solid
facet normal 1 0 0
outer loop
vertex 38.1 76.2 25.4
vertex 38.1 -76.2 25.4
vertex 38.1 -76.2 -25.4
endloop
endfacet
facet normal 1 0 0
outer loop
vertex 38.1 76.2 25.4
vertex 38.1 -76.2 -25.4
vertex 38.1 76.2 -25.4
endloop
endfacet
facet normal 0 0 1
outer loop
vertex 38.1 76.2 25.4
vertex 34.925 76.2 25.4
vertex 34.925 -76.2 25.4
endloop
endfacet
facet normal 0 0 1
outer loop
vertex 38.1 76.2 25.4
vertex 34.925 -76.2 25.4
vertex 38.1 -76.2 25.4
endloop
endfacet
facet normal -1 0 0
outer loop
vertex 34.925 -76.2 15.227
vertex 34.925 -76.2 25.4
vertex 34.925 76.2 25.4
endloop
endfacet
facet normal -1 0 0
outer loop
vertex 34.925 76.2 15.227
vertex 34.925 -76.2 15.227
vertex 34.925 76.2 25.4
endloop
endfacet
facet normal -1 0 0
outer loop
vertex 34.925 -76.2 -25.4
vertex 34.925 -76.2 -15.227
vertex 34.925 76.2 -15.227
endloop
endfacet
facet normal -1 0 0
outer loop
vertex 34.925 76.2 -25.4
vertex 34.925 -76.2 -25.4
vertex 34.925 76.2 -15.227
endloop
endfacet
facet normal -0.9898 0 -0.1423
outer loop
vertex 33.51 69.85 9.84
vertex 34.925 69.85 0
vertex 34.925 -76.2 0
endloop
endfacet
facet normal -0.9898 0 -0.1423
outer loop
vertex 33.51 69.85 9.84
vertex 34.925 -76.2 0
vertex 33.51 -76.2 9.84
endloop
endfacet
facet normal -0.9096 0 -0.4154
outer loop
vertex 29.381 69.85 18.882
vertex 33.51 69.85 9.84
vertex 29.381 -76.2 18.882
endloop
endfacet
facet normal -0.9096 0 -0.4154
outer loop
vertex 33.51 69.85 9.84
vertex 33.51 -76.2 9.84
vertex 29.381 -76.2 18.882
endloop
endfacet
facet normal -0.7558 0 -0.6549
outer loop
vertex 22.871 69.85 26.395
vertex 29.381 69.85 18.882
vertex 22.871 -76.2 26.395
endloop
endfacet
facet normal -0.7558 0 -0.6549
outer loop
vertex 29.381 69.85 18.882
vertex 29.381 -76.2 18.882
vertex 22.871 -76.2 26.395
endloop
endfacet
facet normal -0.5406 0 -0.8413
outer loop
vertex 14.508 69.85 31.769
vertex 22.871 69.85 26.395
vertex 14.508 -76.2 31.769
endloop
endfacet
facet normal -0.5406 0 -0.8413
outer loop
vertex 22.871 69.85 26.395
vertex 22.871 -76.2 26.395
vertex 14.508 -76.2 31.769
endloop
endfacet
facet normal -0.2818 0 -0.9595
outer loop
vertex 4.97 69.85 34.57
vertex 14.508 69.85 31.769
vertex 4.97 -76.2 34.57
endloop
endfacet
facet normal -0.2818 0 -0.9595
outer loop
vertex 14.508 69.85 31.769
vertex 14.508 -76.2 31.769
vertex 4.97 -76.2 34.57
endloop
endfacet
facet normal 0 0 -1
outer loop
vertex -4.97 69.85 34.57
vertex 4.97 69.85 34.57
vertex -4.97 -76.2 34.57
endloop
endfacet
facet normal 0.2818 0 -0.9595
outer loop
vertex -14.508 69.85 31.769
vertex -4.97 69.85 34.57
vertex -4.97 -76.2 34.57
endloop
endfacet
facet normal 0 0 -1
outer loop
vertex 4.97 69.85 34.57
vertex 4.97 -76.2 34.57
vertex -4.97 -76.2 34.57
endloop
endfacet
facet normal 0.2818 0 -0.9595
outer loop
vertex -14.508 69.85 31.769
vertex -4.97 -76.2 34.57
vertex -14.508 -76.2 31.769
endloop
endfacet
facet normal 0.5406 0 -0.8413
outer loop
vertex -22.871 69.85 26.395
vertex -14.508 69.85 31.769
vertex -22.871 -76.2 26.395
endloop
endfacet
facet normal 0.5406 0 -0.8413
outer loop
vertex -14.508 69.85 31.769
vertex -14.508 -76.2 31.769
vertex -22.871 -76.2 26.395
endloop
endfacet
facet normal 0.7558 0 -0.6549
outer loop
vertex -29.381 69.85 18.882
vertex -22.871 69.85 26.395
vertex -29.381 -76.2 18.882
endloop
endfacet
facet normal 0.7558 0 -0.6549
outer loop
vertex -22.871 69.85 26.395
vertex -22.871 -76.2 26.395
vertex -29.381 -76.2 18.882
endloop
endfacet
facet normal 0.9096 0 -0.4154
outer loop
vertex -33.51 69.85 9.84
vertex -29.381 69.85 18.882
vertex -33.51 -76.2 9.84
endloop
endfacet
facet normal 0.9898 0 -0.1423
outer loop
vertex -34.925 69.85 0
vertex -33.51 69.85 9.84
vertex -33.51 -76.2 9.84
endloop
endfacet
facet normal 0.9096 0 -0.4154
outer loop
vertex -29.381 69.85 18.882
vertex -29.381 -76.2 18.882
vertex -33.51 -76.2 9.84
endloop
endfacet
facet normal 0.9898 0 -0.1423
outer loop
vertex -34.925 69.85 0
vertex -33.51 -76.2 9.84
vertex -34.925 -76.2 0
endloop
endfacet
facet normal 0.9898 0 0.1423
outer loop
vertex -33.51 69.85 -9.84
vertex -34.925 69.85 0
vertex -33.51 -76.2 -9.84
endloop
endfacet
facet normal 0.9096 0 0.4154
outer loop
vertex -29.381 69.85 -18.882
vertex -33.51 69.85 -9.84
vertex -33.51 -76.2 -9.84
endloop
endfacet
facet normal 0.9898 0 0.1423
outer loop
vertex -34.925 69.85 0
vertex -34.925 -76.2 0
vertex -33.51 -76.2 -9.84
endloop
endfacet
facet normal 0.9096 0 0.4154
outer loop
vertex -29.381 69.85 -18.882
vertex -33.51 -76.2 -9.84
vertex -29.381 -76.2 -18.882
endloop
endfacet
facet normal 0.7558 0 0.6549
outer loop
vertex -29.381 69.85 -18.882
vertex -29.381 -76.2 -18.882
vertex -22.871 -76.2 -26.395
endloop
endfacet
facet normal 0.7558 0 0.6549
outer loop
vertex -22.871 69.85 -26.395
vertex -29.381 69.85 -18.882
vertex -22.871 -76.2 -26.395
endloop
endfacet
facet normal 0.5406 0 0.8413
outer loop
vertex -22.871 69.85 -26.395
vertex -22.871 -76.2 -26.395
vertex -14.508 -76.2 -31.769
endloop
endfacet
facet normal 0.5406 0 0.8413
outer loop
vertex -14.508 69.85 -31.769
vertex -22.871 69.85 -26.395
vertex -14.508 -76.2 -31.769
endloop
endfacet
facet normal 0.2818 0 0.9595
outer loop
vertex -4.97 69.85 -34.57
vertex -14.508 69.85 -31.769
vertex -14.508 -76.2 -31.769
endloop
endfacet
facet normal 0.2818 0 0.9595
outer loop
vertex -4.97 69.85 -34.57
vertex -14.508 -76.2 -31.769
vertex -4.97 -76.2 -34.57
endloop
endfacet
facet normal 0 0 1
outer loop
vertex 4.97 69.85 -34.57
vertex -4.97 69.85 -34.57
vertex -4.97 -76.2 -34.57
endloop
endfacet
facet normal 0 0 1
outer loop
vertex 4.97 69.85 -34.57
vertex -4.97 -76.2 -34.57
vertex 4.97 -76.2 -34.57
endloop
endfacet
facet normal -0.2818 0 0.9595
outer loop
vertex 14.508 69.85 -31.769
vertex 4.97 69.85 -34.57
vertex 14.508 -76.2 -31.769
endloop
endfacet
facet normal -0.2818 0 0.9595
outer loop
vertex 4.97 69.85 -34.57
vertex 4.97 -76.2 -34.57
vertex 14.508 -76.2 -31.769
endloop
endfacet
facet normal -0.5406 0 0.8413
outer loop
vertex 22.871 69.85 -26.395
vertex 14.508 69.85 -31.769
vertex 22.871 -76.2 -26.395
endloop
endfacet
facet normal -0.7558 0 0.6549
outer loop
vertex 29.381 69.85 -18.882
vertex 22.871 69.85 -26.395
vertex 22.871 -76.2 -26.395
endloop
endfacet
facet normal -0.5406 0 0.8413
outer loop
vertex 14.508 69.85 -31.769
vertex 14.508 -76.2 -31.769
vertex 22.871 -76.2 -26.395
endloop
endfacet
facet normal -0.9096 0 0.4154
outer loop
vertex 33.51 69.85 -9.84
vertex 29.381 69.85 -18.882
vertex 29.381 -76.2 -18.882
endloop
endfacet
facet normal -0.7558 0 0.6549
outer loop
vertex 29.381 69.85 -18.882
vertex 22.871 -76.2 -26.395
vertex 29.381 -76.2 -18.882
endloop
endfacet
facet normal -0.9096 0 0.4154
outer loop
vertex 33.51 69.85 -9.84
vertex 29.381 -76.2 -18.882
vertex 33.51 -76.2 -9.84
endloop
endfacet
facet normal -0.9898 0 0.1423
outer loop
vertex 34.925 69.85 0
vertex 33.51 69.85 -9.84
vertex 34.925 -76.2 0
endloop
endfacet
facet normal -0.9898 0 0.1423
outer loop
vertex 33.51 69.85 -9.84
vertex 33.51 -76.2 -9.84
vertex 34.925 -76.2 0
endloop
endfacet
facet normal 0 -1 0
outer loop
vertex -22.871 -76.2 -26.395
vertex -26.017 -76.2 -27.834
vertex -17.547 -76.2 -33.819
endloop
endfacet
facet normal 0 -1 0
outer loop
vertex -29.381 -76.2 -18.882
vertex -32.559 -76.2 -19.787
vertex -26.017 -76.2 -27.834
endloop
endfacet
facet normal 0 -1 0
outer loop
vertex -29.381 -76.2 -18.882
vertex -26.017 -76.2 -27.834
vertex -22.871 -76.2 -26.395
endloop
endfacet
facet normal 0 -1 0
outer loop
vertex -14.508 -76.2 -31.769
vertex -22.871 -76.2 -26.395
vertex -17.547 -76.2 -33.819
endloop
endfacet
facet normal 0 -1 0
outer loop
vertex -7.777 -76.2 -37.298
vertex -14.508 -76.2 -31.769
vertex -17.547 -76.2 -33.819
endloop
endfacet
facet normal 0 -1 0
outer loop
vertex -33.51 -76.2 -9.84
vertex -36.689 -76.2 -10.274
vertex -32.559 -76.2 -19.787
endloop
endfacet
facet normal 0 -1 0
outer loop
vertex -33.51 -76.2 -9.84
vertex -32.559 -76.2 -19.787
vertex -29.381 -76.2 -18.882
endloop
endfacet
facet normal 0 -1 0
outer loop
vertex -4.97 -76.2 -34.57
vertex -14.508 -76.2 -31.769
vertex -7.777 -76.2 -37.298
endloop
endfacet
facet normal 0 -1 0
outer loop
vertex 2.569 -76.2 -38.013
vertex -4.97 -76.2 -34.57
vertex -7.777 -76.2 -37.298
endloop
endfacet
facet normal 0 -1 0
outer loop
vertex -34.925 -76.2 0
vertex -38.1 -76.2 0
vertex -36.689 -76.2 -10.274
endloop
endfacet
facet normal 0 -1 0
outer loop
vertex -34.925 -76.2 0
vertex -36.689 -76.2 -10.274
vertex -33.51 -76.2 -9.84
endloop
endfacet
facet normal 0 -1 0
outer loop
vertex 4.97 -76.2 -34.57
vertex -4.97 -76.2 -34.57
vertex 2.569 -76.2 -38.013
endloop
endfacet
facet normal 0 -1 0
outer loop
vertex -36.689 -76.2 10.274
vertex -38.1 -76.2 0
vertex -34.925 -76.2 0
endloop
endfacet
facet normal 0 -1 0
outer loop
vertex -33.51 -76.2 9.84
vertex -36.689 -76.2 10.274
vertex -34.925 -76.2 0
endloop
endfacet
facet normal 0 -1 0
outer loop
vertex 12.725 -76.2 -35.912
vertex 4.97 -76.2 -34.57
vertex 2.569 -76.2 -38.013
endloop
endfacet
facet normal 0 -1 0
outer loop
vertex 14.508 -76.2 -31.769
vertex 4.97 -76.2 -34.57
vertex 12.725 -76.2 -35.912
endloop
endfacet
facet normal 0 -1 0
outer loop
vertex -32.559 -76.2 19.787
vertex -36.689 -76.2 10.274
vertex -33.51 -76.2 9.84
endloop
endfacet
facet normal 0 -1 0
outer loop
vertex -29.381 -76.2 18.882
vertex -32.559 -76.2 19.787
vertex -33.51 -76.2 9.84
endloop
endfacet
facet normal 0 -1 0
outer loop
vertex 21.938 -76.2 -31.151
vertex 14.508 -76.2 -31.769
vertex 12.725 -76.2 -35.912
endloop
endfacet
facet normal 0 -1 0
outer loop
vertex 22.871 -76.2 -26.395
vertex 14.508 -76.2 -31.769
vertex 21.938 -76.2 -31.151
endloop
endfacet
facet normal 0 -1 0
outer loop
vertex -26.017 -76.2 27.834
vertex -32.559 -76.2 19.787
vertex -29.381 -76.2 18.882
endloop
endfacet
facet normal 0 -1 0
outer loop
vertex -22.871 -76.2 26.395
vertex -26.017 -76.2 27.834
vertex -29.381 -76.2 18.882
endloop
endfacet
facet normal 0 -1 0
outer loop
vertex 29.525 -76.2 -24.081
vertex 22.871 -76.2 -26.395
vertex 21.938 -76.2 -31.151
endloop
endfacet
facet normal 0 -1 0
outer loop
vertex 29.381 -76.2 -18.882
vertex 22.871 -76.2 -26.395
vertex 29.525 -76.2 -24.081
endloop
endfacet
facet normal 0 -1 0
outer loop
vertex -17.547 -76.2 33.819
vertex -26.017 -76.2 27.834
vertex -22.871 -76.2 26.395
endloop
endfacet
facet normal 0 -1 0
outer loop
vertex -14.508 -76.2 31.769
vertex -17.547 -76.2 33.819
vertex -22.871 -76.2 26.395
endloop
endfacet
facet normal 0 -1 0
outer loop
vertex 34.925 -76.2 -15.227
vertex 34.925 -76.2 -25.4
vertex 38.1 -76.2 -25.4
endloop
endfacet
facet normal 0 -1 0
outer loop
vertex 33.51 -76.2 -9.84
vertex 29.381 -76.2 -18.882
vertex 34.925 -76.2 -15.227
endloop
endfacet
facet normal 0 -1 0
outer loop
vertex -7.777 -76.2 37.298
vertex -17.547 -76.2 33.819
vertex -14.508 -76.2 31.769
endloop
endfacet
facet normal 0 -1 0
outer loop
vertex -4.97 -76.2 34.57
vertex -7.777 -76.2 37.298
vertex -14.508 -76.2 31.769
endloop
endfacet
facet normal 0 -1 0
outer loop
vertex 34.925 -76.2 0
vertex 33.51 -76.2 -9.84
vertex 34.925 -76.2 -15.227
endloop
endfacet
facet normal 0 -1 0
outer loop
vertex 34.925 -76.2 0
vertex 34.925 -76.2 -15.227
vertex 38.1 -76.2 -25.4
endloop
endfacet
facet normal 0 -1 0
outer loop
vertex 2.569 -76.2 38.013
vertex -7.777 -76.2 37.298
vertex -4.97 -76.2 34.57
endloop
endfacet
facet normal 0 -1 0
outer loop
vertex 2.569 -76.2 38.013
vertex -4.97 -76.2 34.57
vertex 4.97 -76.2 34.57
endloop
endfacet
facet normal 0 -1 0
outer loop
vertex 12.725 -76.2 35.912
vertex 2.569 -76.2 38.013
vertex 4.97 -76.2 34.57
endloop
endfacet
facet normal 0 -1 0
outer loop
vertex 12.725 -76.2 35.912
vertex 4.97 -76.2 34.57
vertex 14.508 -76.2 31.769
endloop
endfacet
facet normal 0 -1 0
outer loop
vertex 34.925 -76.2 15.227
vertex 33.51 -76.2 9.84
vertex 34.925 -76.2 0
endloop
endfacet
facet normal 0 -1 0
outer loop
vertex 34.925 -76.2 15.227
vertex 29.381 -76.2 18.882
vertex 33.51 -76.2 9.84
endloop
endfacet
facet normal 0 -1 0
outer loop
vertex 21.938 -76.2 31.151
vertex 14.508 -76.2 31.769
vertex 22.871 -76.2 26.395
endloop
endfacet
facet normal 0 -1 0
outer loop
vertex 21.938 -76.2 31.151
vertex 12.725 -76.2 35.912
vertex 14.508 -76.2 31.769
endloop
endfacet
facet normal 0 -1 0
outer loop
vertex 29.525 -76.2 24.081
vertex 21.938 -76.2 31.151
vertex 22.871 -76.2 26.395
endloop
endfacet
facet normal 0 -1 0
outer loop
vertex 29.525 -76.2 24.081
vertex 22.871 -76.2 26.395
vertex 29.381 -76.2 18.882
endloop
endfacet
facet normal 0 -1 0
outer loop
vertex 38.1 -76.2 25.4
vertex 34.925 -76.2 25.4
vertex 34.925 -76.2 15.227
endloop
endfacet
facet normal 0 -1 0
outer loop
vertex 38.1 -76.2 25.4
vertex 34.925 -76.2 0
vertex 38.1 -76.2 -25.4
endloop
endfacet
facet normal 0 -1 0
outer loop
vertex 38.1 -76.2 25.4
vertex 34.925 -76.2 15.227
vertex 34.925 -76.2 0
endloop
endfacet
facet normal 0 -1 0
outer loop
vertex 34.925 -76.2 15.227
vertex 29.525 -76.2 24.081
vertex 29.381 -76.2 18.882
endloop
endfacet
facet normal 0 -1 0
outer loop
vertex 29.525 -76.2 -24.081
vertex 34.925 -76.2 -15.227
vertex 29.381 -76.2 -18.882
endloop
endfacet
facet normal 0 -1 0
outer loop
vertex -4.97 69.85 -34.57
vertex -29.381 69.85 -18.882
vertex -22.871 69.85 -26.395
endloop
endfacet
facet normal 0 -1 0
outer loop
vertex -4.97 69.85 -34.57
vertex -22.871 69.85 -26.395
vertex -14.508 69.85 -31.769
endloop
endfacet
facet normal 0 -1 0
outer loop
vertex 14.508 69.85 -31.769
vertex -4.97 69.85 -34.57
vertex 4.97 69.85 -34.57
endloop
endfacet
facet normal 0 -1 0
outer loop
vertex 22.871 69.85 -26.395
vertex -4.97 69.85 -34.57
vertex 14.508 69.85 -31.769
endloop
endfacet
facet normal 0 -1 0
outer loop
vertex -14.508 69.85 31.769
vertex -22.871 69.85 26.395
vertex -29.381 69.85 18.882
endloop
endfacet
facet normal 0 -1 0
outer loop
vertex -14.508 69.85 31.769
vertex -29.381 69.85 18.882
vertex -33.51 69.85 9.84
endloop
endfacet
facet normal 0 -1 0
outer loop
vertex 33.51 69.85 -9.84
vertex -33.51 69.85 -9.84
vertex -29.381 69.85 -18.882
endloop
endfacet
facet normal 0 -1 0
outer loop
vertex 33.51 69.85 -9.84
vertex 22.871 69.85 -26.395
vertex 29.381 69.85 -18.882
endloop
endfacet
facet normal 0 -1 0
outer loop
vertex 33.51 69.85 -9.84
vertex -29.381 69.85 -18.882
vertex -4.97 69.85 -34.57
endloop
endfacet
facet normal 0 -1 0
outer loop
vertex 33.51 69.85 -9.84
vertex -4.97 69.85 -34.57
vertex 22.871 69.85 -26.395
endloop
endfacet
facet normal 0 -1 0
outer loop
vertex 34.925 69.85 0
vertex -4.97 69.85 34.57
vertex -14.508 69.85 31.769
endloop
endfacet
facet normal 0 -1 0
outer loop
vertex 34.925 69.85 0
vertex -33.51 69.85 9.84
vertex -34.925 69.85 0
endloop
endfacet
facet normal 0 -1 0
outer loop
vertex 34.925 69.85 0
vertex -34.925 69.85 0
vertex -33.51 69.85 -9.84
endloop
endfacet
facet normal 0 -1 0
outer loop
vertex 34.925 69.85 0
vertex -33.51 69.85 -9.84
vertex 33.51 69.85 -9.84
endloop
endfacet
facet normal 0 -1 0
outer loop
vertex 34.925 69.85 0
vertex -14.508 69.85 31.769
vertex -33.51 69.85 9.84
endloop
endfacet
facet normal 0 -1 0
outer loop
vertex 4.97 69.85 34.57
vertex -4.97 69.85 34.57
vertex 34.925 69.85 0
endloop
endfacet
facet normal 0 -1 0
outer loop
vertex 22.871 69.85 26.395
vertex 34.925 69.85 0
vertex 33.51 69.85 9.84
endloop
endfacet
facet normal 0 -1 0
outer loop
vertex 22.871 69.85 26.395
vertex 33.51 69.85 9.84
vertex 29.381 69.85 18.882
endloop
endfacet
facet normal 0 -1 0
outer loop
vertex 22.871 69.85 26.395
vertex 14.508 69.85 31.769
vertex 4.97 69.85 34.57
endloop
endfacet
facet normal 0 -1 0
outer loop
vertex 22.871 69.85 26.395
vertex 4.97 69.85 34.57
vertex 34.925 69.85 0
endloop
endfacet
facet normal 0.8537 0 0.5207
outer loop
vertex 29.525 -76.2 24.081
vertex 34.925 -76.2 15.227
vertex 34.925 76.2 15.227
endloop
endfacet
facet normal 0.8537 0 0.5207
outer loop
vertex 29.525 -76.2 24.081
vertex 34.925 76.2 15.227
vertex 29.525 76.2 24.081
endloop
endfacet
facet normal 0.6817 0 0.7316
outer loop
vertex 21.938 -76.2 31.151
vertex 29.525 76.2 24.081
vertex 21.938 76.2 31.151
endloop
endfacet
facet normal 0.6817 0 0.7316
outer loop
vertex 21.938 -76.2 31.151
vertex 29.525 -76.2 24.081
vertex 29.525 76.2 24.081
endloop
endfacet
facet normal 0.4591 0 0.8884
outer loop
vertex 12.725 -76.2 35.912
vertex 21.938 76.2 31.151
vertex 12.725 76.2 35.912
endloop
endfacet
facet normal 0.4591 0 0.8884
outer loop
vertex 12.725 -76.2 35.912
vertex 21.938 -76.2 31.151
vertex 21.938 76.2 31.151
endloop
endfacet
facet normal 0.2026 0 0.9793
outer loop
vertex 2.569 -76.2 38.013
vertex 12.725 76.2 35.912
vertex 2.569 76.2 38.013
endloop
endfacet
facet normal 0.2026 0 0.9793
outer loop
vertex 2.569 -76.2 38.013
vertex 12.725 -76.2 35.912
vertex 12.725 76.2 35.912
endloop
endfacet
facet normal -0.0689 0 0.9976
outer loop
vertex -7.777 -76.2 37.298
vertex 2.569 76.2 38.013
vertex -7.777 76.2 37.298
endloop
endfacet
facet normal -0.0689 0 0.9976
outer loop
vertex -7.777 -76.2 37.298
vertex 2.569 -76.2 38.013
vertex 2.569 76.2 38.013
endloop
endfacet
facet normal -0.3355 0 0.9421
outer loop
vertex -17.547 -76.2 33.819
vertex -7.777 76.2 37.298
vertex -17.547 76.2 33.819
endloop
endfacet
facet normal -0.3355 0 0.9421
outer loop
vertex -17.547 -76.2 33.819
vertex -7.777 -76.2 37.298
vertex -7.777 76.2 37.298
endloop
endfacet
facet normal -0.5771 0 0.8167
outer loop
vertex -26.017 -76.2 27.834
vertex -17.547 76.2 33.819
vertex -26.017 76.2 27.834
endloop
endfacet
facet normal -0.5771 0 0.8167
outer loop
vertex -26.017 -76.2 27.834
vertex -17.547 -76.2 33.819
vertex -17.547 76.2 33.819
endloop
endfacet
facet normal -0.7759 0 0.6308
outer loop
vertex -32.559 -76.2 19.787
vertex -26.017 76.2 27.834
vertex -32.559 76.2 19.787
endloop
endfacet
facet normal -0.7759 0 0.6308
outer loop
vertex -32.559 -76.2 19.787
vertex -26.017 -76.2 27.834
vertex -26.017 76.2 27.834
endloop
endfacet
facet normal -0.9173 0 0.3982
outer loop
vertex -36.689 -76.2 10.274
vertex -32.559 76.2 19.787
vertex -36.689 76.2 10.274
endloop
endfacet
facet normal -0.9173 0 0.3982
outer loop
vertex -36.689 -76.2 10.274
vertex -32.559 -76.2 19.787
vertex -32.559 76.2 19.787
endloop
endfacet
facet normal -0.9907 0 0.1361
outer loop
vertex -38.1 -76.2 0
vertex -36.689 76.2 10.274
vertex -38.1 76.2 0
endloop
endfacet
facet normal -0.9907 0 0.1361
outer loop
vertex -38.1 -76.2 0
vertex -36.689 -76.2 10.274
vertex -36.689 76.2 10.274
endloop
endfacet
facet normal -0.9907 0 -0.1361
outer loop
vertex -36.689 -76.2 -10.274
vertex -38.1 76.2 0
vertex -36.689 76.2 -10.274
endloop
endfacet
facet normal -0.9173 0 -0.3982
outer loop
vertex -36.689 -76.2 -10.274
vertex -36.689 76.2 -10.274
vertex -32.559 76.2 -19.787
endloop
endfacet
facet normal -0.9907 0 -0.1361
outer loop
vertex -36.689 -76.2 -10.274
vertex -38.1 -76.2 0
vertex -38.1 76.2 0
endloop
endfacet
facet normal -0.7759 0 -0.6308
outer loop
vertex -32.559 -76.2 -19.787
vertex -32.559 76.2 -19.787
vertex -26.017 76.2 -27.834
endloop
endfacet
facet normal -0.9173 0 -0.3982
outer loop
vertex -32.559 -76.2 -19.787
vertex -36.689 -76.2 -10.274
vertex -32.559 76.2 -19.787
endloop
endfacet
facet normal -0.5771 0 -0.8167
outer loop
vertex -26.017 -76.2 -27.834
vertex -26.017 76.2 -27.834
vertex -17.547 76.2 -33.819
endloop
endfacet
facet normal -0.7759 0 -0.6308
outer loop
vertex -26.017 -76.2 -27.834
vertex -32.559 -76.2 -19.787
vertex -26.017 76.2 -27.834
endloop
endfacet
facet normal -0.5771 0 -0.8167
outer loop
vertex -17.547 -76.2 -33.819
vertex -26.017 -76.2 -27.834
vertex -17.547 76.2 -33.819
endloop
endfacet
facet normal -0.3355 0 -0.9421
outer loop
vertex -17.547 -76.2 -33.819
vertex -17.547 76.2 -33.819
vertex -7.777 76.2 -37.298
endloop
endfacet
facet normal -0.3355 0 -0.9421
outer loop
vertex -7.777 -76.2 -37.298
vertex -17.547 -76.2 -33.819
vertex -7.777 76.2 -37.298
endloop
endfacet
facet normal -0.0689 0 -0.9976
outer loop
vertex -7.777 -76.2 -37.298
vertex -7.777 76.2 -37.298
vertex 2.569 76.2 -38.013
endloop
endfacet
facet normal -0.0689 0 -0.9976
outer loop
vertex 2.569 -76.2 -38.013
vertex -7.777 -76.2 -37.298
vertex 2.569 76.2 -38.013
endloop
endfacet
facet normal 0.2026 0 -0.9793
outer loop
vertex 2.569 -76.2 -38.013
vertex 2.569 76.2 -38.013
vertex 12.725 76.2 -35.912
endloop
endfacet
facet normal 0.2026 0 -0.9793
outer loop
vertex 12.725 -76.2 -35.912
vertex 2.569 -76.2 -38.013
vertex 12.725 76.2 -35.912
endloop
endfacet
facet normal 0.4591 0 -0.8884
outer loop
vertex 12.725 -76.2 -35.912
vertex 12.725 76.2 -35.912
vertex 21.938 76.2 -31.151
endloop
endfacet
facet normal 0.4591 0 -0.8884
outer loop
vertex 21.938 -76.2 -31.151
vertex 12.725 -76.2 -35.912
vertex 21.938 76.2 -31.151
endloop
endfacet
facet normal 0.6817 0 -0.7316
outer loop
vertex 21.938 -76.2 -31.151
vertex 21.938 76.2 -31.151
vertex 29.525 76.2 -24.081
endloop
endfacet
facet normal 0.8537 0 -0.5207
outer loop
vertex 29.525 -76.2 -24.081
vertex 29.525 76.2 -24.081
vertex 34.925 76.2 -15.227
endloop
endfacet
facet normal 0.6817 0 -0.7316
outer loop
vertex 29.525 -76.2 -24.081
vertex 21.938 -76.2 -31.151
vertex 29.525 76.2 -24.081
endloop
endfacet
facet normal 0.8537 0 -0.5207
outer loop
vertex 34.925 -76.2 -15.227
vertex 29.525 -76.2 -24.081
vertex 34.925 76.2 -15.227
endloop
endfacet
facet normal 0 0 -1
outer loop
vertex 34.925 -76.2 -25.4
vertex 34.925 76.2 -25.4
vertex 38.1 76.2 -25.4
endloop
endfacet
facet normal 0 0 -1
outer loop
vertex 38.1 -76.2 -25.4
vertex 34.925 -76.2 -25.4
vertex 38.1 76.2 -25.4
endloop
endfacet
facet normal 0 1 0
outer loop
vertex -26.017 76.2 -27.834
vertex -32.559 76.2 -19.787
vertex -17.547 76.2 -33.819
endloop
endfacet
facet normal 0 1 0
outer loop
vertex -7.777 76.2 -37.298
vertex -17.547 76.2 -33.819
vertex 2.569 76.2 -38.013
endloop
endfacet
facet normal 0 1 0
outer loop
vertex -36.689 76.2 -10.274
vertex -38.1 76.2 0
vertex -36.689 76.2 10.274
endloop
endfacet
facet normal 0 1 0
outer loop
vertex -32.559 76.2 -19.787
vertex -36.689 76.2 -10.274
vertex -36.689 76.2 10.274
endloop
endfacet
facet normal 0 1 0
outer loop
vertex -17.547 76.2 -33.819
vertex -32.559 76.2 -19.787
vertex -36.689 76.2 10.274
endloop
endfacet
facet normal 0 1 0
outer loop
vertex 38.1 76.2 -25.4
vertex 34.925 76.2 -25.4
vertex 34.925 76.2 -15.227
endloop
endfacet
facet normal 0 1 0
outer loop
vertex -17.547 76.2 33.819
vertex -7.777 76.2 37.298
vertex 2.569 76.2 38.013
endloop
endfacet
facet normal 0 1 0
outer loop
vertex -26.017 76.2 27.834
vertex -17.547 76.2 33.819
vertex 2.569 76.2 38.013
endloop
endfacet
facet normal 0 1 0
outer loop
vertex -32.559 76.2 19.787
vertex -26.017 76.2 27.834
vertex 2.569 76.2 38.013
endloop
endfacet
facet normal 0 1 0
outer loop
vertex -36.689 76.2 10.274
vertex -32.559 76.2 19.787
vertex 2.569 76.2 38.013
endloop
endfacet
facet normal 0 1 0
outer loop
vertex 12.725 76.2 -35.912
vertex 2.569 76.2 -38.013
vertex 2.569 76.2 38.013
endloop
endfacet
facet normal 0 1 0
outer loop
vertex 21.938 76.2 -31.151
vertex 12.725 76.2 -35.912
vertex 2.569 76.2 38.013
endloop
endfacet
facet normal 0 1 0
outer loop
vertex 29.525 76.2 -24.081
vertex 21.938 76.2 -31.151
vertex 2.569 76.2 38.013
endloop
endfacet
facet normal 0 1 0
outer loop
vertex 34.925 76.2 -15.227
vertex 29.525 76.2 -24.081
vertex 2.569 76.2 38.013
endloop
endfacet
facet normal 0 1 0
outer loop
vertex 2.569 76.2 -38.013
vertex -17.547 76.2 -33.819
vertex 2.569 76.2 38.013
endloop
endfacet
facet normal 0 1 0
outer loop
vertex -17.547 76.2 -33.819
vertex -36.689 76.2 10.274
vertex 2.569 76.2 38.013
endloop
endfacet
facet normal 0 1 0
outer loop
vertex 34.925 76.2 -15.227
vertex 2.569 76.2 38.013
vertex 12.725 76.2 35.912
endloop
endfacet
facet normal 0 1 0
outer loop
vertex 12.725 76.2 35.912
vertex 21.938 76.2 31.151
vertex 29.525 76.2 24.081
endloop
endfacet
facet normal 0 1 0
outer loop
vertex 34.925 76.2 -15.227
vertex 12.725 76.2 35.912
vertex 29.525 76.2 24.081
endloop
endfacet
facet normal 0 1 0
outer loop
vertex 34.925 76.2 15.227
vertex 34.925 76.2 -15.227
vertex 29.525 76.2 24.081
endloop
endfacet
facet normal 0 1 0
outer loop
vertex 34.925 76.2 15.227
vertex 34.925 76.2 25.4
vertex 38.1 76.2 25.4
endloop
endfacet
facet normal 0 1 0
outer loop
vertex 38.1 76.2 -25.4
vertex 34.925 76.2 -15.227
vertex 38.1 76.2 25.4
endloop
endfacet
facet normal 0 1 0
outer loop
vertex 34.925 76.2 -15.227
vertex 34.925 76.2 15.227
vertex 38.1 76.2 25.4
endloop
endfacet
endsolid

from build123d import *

# Parameters (mm, degrees)
F0_R     = 38.1
F1_DEPTH = 76.2
F2_R     = 34.925
F3_DEPTH = 146.05
F4_W     = 3.175
F4_H     = 152.4
F5_DEPTH = 25.4


with BuildPart() as f1:
    # F0 (on Front) → F1 (new body, symmetric)
    with BuildSketch(Plane.XZ):
        Circle(F0_R)
    extrude(amount=F1_DEPTH, both=True)

    # F2 (on face) → F3 (cut)
    with BuildSketch(Plane.XZ.offset(76.2)):
        Circle(F2_R)
    extrude(amount=-F3_DEPTH, mode=Mode.SUBTRACT)

    # F4 (on Top) → F5 (join, symmetric)
    with BuildSketch(Plane.XY):
        with Locations((36.5125, 0)):
            Rectangle(F4_W, F4_H)
    extrude(amount=F5_DEPTH, both=True)


solid = f1.part
